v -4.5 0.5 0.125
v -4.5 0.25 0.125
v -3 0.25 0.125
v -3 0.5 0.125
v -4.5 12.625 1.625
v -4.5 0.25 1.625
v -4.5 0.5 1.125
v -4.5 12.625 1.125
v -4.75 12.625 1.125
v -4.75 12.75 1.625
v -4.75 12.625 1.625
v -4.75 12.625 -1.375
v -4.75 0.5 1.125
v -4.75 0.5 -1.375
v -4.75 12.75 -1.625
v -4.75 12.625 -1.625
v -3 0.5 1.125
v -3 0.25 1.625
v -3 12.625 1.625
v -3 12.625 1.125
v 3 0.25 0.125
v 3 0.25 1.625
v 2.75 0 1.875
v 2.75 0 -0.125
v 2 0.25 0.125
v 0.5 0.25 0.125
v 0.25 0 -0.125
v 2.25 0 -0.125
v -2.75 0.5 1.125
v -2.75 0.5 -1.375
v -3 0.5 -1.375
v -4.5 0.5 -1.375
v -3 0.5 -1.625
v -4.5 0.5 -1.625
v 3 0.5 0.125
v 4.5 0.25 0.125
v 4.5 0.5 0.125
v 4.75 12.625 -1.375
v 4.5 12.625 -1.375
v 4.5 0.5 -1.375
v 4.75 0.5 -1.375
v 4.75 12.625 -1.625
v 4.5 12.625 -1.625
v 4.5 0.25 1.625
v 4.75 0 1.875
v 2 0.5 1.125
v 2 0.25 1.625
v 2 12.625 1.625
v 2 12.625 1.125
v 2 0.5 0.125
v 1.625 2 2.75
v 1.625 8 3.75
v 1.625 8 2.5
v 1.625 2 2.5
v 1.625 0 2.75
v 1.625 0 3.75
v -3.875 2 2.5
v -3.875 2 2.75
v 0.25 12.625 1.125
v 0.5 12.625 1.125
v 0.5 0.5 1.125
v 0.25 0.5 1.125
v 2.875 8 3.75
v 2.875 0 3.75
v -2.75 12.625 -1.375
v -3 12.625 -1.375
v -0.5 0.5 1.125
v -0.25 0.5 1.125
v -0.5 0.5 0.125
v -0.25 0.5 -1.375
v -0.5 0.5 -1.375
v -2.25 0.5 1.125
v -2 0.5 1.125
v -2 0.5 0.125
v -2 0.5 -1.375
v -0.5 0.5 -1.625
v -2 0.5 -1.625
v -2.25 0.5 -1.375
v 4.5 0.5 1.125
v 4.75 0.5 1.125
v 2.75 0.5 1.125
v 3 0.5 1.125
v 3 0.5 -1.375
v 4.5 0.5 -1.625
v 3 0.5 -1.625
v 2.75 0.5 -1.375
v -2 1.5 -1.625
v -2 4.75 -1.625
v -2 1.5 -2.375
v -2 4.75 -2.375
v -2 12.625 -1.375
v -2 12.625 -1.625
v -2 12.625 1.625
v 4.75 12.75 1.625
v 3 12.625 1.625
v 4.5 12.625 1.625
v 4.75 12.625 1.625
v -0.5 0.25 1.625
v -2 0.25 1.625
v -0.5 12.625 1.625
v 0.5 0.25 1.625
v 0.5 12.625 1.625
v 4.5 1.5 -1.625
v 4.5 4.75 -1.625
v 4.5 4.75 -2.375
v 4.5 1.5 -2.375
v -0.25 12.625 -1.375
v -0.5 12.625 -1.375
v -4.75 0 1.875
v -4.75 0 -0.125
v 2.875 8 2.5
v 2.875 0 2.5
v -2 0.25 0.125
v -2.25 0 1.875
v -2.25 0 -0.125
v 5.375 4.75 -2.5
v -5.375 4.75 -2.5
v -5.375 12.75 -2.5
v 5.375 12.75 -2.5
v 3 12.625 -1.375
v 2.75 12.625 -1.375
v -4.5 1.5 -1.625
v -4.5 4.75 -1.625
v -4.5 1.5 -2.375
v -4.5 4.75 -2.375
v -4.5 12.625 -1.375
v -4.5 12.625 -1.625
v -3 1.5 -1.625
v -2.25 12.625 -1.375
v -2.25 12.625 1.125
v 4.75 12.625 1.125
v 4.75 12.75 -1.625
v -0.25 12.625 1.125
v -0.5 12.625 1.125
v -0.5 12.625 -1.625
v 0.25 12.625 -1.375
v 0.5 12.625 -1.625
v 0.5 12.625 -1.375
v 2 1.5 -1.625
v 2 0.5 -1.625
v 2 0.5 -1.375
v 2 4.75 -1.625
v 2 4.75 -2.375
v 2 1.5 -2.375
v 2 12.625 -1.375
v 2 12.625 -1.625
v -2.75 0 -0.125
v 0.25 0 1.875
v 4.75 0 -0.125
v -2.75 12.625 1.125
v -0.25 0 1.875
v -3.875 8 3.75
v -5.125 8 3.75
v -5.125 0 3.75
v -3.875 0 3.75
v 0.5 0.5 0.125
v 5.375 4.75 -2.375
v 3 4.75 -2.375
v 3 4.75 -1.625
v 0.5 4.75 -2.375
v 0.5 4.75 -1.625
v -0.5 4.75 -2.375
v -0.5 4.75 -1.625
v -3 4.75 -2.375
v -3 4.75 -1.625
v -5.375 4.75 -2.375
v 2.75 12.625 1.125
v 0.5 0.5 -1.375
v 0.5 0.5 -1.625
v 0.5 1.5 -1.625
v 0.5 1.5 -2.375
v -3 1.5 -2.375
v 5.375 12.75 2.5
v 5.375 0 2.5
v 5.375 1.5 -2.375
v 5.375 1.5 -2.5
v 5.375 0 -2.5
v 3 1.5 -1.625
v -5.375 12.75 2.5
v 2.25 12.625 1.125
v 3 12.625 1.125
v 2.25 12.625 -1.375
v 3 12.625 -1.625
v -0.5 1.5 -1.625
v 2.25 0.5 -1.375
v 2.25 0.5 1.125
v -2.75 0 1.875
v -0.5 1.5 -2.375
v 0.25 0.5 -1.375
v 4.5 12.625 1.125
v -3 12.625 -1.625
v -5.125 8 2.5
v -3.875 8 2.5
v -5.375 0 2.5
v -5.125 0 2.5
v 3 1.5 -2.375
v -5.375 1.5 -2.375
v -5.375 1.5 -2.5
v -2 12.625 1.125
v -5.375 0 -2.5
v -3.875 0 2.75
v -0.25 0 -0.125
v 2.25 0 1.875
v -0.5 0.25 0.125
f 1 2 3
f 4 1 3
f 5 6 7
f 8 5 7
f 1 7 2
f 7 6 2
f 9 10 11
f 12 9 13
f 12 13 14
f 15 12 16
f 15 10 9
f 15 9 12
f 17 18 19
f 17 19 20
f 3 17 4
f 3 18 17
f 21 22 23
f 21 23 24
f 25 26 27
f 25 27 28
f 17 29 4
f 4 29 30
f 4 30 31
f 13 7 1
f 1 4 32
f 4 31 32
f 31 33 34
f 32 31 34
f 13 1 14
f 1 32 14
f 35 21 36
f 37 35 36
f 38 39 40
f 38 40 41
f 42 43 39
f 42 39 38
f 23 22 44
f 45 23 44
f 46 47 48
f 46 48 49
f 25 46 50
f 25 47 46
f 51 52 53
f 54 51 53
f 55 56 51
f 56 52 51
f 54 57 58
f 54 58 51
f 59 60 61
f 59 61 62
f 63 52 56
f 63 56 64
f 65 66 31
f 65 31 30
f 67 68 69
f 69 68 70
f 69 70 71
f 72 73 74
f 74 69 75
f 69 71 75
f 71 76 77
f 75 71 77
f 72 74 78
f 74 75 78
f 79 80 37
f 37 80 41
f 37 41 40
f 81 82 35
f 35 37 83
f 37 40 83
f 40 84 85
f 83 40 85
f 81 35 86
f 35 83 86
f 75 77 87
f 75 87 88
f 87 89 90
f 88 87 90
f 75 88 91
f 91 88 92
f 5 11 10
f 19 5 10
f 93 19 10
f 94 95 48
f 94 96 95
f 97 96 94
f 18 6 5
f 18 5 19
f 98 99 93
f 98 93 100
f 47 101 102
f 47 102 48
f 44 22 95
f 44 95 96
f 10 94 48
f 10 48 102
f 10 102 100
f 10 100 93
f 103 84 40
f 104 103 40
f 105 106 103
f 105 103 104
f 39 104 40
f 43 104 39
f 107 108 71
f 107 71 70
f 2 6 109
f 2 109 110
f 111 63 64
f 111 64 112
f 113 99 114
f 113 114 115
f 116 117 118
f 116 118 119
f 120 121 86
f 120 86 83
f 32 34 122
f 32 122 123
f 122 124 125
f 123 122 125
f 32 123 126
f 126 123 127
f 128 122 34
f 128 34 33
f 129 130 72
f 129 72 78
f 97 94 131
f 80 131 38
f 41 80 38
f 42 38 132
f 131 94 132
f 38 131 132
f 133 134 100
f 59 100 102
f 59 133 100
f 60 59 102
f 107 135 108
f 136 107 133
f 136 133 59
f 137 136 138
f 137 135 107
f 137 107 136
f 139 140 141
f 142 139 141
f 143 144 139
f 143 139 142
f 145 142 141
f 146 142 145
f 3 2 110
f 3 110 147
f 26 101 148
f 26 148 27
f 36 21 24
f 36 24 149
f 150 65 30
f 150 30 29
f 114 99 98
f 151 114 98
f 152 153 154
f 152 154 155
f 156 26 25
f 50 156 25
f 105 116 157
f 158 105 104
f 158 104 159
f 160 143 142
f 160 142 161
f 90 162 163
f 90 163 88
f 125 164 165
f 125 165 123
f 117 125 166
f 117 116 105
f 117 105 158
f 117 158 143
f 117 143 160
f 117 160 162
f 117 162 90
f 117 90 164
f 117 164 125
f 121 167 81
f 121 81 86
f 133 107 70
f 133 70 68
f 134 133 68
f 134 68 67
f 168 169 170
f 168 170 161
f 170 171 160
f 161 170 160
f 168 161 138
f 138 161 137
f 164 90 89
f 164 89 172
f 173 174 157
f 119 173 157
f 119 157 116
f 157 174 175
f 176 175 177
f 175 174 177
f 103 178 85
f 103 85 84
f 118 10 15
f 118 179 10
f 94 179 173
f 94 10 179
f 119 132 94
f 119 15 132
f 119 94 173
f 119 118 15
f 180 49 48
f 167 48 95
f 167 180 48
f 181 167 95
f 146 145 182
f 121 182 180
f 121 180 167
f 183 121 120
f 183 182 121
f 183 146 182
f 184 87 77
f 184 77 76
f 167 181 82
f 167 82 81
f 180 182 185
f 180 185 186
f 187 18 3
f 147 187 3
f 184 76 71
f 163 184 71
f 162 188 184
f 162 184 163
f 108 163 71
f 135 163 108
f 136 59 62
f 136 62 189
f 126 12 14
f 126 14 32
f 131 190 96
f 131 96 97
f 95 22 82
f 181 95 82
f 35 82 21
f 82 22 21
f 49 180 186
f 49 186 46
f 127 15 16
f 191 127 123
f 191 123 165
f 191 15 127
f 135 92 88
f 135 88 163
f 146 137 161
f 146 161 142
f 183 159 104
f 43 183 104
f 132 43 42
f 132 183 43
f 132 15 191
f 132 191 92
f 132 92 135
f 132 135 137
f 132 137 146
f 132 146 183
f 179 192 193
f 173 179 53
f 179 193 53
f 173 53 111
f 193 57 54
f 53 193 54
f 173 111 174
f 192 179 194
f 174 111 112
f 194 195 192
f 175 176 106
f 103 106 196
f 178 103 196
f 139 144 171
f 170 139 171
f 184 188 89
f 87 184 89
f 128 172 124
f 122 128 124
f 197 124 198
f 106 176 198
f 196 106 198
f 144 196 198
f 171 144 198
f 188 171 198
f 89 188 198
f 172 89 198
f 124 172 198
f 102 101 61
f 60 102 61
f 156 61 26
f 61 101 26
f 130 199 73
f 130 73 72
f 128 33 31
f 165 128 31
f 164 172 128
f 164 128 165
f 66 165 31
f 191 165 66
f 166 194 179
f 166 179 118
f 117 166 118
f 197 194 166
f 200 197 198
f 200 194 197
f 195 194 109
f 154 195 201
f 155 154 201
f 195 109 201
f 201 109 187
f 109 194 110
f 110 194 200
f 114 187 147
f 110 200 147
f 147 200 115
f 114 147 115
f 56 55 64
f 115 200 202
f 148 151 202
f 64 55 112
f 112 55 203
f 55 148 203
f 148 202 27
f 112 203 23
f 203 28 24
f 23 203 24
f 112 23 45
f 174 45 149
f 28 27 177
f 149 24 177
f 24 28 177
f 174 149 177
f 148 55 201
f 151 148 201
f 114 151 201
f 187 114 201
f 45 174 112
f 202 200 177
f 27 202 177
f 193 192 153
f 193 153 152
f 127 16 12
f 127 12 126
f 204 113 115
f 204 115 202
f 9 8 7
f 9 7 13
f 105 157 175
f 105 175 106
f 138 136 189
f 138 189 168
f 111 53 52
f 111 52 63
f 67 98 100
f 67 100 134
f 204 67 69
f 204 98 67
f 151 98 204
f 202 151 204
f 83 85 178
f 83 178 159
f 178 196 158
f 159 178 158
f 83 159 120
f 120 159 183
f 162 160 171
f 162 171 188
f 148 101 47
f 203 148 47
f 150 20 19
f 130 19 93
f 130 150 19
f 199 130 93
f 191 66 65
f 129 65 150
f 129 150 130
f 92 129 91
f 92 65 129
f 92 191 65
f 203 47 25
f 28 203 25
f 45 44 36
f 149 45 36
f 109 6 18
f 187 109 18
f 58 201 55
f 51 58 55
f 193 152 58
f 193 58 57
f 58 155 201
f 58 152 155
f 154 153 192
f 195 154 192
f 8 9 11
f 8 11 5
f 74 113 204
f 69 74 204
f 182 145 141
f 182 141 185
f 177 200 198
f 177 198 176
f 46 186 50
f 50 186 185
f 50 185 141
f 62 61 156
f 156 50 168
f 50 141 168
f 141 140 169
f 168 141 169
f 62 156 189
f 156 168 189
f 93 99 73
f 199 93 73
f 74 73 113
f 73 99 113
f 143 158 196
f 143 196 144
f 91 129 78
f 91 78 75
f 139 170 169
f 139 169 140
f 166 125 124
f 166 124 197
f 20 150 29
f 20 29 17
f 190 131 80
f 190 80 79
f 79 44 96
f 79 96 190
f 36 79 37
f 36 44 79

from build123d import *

# Parameters (mm, degrees)
SKIZZE1_W                       = 10.75
SKIZZE1_H                       = 5
AUFSATZ_LINEAR_AUSTRAGEN1_DEPTH = 12.75
SKIZZE2_W                       = 1.25
SKIZZE2_H                       = 1.25
AUFSATZ_LINEAR_AUSTRAGEN2_DEPTH = 8
SKIZZE3_W                       = 5.5
SKIZZE3_H                       = 0.25
AUFSATZ_LINEAR_AUSTRAGEN3_DEPTH = 2
SKIZZE4_W                       = 1.5
SKIZZE4_H                       = 1.5
SCHNITT_LINEAR_AUSTRAGEN2_DEPTH = 15.335816161
FASE1_SIZE                      = 0.25
SCHNITT_LINEAR_AUSTRAGEN3_DEPTH = 12.25
SKIZZE6_W                       = 9.5
SKIZZE6_H                       = 3.25
SCHNITT_LINEAR_AUSTRAGEN4_DEPTH = 0.125
SKIZZE7_W                       = 1.5
SKIZZE7_H                       = 3.25
SCHNITT_LINEAR_AUSTRAGEN5_DEPTH = 1
SKIZZE8_W                       = 10.75
SKIZZE8_H                       = 3.25
SCHNITT_LINEAR_AUSTRAGEN6_DEPTH = 0.125


with BuildPart() as part:
    # Skizze1 → Aufsatz-Linear austragen1 (new body)
    with BuildSketch(Plane(origin=(0, 0, 0), x_dir=(1, 0, 0), z_dir=(0, 1, 0))):
        Rectangle(SKIZZE1_W, SKIZZE1_H)
    extrude(amount=AUFSATZ_LINEAR_AUSTRAGEN1_DEPTH)

    # Skizze2 → Aufsatz-Linear austragen2 (add)
    with BuildSketch(Plane(origin=(0, 0, 0), x_dir=(1, 0, 0), z_dir=(0, 1, 0))):
        with Locations((-4.5, -3.125)):
            Rectangle(SKIZZE2_W, SKIZZE2_H)
        with Locations((2.25, -3.125)):
            Rectangle(SKIZZE2_W, SKIZZE2_H)
    extrude(amount=AUFSATZ_LINEAR_AUSTRAGEN2_DEPTH)

    # Skizze3 → Aufsatz-Linear austragen3 (add)
    with BuildSketch(Plane(origin=(0, 0, 0), x_dir=(1, 0, 0), z_dir=(0, 1, 0))):
        with Locations((-1.125, -2.625)):
            Rectangle(SKIZZE3_W, SKIZZE3_H)
    extrude(amount=AUFSATZ_LINEAR_AUSTRAGEN3_DEPTH)

    # Skizze4 → Schnitt-Linear austragen2 (cut, through all)
    with BuildSketch(Plane(origin=(0, 0, 0), x_dir=(1, 0, 0), z_dir=(0, 1, 0))):
        with Locations((-3.75, -0.875)):
            Rectangle(SKIZZE4_W, SKIZZE4_H)
        with Locations((-1.25, -0.875)):
            Rectangle(SKIZZE4_W, SKIZZE4_H)
        with Locations((1.25, -0.875)):
            Rectangle(SKIZZE4_W, SKIZZE4_H)
        with Locations((3.75, -0.875)):
            Rectangle(SKIZZE4_W, SKIZZE4_H)
    extrude(amount=SCHNITT_LINEAR_AUSTRAGEN2_DEPTH, mode=Mode.SUBTRACT)

    # Fase1
    fase1_edges = [part.edges().sort_by_distance(p)[0] for p in [
        (-4.5, 0, 0.875),
        (-3.75, 0, 1.625),
        (-3, 0, 0.875),
        (-3.75, 0, 0.125),
        (-2, 0, 0.875),
        (-1.25, 0, 1.625),
        (-0.5, 0, 0.875),
        (-1.25, 0, 0.125),
        (0.5, 0, 0.875),
        (1.25, 0, 1.625),
        (2, 0, 0.875),
        (1.25, 0, 0.125),
        (3, 0, 0.875),
        (3.75, 0, 1.625),
        (4.5, 0, 0.875),
        (3.75, 0, 0.125),
    ]]
    chamfer(fase1_edges, length=FASE1_SIZE)

    # Skizze5 → Schnitt-Linear austragen3 (cut)
    with BuildSketch(Plane(origin=(0, 12.75, 0), x_dir=(1, 0, 0), z_dir=(0, 1, 0))):
        Polygon((-4.5, 1.625), (-3, 1.625), (-3, 1.375), (-2.75, 1.375), (-2.75, -1.125), (-3, -1.125), (-3, -1.625), (-4.5, -1.625), (-4.5, -1.125), (-4.75, -1.125), (-4.75, 1.375), (-4.5, 1.375), align=None)
        Polygon((-2, 1.625), (-0.5, 1.625), (-0.5, 1.375), (-0.25, 1.375), (-0.25, -1.125), (-0.5, -1.125), (-0.5, -1.625), (-2, -1.625), (-2, -1.125), (-2.25, -1.125), (-2.25, 1.375), (-2, 1.375), align=None)
        Polygon((0.5, 1.625), (2, 1.625), (2, 1.375), (2.25, 1.375), (2.25, -1.125), (2, -1.125), (2, -1.625), (0.5, -1.625), (0.5, -1.125), (0.25, -1.125), (0.25, 1.375), (0.5, 1.375), align=None)
        Polygon((3, 1.625), (4.5, 1.625), (4.5, 1.375), (4.75, 1.375), (4.75, -1.125), (4.5, -1.125), (4.5, -1.625), (3, -1.625), (3, -1.125), (2.75, -1.125), (2.75, 1.375), (3, 1.375), align=None)
    extrude(amount=-SCHNITT_LINEAR_AUSTRAGEN3_DEPTH, mode=Mode.SUBTRACT)

    # Skizze6 → Schnitt-Linear austragen4 (cut)
    with BuildSketch(Plane(origin=(0, 12.75, 0), x_dir=(1, 0, 0), z_dir=(0, 1, 0))):
        Rectangle(SKIZZE6_W, SKIZZE6_H)
    extrude(amount=-SCHNITT_LINEAR_AUSTRAGEN4_DEPTH, mode=Mode.SUBTRACT)

    # Skizze7 → Schnitt-Linear austragen5 (cut)
    with BuildSketch(Plane(origin=(0, 0, -2.5), x_dir=(-1, 0, 0), z_dir=(0, 0, -1))):
        with Locations((-3.75, 3.125)):
            Rectangle(SKIZZE7_W, SKIZZE7_H)
        with Locations((-1.25, 3.125)):
            Rectangle(SKIZZE7_W, SKIZZE7_H)
        with Locations((1.25, 3.125)):
            Rectangle(SKIZZE7_W, SKIZZE7_H)
        with Locations((3.75, 3.125)):
            Rectangle(SKIZZE7_W, SKIZZE7_H)
    extrude(amount=-SCHNITT_LINEAR_AUSTRAGEN5_DEPTH, mode=Mode.SUBTRACT)

    # Skizze8 → Schnitt-Linear austragen6 (cut)
    with BuildSketch(Plane(origin=(0, 0, -2.5), x_dir=(-1, 0, 0), z_dir=(0, 0, -1))):
        with Locations((0, 3.125)):
            Rectangle(SKIZZE8_W, SKIZZE8_H)
    extrude(amount=-SCHNITT_LINEAR_AUSTRAGEN6_DEPTH, mode=Mode.SUBTRACT)


solid = part.part
